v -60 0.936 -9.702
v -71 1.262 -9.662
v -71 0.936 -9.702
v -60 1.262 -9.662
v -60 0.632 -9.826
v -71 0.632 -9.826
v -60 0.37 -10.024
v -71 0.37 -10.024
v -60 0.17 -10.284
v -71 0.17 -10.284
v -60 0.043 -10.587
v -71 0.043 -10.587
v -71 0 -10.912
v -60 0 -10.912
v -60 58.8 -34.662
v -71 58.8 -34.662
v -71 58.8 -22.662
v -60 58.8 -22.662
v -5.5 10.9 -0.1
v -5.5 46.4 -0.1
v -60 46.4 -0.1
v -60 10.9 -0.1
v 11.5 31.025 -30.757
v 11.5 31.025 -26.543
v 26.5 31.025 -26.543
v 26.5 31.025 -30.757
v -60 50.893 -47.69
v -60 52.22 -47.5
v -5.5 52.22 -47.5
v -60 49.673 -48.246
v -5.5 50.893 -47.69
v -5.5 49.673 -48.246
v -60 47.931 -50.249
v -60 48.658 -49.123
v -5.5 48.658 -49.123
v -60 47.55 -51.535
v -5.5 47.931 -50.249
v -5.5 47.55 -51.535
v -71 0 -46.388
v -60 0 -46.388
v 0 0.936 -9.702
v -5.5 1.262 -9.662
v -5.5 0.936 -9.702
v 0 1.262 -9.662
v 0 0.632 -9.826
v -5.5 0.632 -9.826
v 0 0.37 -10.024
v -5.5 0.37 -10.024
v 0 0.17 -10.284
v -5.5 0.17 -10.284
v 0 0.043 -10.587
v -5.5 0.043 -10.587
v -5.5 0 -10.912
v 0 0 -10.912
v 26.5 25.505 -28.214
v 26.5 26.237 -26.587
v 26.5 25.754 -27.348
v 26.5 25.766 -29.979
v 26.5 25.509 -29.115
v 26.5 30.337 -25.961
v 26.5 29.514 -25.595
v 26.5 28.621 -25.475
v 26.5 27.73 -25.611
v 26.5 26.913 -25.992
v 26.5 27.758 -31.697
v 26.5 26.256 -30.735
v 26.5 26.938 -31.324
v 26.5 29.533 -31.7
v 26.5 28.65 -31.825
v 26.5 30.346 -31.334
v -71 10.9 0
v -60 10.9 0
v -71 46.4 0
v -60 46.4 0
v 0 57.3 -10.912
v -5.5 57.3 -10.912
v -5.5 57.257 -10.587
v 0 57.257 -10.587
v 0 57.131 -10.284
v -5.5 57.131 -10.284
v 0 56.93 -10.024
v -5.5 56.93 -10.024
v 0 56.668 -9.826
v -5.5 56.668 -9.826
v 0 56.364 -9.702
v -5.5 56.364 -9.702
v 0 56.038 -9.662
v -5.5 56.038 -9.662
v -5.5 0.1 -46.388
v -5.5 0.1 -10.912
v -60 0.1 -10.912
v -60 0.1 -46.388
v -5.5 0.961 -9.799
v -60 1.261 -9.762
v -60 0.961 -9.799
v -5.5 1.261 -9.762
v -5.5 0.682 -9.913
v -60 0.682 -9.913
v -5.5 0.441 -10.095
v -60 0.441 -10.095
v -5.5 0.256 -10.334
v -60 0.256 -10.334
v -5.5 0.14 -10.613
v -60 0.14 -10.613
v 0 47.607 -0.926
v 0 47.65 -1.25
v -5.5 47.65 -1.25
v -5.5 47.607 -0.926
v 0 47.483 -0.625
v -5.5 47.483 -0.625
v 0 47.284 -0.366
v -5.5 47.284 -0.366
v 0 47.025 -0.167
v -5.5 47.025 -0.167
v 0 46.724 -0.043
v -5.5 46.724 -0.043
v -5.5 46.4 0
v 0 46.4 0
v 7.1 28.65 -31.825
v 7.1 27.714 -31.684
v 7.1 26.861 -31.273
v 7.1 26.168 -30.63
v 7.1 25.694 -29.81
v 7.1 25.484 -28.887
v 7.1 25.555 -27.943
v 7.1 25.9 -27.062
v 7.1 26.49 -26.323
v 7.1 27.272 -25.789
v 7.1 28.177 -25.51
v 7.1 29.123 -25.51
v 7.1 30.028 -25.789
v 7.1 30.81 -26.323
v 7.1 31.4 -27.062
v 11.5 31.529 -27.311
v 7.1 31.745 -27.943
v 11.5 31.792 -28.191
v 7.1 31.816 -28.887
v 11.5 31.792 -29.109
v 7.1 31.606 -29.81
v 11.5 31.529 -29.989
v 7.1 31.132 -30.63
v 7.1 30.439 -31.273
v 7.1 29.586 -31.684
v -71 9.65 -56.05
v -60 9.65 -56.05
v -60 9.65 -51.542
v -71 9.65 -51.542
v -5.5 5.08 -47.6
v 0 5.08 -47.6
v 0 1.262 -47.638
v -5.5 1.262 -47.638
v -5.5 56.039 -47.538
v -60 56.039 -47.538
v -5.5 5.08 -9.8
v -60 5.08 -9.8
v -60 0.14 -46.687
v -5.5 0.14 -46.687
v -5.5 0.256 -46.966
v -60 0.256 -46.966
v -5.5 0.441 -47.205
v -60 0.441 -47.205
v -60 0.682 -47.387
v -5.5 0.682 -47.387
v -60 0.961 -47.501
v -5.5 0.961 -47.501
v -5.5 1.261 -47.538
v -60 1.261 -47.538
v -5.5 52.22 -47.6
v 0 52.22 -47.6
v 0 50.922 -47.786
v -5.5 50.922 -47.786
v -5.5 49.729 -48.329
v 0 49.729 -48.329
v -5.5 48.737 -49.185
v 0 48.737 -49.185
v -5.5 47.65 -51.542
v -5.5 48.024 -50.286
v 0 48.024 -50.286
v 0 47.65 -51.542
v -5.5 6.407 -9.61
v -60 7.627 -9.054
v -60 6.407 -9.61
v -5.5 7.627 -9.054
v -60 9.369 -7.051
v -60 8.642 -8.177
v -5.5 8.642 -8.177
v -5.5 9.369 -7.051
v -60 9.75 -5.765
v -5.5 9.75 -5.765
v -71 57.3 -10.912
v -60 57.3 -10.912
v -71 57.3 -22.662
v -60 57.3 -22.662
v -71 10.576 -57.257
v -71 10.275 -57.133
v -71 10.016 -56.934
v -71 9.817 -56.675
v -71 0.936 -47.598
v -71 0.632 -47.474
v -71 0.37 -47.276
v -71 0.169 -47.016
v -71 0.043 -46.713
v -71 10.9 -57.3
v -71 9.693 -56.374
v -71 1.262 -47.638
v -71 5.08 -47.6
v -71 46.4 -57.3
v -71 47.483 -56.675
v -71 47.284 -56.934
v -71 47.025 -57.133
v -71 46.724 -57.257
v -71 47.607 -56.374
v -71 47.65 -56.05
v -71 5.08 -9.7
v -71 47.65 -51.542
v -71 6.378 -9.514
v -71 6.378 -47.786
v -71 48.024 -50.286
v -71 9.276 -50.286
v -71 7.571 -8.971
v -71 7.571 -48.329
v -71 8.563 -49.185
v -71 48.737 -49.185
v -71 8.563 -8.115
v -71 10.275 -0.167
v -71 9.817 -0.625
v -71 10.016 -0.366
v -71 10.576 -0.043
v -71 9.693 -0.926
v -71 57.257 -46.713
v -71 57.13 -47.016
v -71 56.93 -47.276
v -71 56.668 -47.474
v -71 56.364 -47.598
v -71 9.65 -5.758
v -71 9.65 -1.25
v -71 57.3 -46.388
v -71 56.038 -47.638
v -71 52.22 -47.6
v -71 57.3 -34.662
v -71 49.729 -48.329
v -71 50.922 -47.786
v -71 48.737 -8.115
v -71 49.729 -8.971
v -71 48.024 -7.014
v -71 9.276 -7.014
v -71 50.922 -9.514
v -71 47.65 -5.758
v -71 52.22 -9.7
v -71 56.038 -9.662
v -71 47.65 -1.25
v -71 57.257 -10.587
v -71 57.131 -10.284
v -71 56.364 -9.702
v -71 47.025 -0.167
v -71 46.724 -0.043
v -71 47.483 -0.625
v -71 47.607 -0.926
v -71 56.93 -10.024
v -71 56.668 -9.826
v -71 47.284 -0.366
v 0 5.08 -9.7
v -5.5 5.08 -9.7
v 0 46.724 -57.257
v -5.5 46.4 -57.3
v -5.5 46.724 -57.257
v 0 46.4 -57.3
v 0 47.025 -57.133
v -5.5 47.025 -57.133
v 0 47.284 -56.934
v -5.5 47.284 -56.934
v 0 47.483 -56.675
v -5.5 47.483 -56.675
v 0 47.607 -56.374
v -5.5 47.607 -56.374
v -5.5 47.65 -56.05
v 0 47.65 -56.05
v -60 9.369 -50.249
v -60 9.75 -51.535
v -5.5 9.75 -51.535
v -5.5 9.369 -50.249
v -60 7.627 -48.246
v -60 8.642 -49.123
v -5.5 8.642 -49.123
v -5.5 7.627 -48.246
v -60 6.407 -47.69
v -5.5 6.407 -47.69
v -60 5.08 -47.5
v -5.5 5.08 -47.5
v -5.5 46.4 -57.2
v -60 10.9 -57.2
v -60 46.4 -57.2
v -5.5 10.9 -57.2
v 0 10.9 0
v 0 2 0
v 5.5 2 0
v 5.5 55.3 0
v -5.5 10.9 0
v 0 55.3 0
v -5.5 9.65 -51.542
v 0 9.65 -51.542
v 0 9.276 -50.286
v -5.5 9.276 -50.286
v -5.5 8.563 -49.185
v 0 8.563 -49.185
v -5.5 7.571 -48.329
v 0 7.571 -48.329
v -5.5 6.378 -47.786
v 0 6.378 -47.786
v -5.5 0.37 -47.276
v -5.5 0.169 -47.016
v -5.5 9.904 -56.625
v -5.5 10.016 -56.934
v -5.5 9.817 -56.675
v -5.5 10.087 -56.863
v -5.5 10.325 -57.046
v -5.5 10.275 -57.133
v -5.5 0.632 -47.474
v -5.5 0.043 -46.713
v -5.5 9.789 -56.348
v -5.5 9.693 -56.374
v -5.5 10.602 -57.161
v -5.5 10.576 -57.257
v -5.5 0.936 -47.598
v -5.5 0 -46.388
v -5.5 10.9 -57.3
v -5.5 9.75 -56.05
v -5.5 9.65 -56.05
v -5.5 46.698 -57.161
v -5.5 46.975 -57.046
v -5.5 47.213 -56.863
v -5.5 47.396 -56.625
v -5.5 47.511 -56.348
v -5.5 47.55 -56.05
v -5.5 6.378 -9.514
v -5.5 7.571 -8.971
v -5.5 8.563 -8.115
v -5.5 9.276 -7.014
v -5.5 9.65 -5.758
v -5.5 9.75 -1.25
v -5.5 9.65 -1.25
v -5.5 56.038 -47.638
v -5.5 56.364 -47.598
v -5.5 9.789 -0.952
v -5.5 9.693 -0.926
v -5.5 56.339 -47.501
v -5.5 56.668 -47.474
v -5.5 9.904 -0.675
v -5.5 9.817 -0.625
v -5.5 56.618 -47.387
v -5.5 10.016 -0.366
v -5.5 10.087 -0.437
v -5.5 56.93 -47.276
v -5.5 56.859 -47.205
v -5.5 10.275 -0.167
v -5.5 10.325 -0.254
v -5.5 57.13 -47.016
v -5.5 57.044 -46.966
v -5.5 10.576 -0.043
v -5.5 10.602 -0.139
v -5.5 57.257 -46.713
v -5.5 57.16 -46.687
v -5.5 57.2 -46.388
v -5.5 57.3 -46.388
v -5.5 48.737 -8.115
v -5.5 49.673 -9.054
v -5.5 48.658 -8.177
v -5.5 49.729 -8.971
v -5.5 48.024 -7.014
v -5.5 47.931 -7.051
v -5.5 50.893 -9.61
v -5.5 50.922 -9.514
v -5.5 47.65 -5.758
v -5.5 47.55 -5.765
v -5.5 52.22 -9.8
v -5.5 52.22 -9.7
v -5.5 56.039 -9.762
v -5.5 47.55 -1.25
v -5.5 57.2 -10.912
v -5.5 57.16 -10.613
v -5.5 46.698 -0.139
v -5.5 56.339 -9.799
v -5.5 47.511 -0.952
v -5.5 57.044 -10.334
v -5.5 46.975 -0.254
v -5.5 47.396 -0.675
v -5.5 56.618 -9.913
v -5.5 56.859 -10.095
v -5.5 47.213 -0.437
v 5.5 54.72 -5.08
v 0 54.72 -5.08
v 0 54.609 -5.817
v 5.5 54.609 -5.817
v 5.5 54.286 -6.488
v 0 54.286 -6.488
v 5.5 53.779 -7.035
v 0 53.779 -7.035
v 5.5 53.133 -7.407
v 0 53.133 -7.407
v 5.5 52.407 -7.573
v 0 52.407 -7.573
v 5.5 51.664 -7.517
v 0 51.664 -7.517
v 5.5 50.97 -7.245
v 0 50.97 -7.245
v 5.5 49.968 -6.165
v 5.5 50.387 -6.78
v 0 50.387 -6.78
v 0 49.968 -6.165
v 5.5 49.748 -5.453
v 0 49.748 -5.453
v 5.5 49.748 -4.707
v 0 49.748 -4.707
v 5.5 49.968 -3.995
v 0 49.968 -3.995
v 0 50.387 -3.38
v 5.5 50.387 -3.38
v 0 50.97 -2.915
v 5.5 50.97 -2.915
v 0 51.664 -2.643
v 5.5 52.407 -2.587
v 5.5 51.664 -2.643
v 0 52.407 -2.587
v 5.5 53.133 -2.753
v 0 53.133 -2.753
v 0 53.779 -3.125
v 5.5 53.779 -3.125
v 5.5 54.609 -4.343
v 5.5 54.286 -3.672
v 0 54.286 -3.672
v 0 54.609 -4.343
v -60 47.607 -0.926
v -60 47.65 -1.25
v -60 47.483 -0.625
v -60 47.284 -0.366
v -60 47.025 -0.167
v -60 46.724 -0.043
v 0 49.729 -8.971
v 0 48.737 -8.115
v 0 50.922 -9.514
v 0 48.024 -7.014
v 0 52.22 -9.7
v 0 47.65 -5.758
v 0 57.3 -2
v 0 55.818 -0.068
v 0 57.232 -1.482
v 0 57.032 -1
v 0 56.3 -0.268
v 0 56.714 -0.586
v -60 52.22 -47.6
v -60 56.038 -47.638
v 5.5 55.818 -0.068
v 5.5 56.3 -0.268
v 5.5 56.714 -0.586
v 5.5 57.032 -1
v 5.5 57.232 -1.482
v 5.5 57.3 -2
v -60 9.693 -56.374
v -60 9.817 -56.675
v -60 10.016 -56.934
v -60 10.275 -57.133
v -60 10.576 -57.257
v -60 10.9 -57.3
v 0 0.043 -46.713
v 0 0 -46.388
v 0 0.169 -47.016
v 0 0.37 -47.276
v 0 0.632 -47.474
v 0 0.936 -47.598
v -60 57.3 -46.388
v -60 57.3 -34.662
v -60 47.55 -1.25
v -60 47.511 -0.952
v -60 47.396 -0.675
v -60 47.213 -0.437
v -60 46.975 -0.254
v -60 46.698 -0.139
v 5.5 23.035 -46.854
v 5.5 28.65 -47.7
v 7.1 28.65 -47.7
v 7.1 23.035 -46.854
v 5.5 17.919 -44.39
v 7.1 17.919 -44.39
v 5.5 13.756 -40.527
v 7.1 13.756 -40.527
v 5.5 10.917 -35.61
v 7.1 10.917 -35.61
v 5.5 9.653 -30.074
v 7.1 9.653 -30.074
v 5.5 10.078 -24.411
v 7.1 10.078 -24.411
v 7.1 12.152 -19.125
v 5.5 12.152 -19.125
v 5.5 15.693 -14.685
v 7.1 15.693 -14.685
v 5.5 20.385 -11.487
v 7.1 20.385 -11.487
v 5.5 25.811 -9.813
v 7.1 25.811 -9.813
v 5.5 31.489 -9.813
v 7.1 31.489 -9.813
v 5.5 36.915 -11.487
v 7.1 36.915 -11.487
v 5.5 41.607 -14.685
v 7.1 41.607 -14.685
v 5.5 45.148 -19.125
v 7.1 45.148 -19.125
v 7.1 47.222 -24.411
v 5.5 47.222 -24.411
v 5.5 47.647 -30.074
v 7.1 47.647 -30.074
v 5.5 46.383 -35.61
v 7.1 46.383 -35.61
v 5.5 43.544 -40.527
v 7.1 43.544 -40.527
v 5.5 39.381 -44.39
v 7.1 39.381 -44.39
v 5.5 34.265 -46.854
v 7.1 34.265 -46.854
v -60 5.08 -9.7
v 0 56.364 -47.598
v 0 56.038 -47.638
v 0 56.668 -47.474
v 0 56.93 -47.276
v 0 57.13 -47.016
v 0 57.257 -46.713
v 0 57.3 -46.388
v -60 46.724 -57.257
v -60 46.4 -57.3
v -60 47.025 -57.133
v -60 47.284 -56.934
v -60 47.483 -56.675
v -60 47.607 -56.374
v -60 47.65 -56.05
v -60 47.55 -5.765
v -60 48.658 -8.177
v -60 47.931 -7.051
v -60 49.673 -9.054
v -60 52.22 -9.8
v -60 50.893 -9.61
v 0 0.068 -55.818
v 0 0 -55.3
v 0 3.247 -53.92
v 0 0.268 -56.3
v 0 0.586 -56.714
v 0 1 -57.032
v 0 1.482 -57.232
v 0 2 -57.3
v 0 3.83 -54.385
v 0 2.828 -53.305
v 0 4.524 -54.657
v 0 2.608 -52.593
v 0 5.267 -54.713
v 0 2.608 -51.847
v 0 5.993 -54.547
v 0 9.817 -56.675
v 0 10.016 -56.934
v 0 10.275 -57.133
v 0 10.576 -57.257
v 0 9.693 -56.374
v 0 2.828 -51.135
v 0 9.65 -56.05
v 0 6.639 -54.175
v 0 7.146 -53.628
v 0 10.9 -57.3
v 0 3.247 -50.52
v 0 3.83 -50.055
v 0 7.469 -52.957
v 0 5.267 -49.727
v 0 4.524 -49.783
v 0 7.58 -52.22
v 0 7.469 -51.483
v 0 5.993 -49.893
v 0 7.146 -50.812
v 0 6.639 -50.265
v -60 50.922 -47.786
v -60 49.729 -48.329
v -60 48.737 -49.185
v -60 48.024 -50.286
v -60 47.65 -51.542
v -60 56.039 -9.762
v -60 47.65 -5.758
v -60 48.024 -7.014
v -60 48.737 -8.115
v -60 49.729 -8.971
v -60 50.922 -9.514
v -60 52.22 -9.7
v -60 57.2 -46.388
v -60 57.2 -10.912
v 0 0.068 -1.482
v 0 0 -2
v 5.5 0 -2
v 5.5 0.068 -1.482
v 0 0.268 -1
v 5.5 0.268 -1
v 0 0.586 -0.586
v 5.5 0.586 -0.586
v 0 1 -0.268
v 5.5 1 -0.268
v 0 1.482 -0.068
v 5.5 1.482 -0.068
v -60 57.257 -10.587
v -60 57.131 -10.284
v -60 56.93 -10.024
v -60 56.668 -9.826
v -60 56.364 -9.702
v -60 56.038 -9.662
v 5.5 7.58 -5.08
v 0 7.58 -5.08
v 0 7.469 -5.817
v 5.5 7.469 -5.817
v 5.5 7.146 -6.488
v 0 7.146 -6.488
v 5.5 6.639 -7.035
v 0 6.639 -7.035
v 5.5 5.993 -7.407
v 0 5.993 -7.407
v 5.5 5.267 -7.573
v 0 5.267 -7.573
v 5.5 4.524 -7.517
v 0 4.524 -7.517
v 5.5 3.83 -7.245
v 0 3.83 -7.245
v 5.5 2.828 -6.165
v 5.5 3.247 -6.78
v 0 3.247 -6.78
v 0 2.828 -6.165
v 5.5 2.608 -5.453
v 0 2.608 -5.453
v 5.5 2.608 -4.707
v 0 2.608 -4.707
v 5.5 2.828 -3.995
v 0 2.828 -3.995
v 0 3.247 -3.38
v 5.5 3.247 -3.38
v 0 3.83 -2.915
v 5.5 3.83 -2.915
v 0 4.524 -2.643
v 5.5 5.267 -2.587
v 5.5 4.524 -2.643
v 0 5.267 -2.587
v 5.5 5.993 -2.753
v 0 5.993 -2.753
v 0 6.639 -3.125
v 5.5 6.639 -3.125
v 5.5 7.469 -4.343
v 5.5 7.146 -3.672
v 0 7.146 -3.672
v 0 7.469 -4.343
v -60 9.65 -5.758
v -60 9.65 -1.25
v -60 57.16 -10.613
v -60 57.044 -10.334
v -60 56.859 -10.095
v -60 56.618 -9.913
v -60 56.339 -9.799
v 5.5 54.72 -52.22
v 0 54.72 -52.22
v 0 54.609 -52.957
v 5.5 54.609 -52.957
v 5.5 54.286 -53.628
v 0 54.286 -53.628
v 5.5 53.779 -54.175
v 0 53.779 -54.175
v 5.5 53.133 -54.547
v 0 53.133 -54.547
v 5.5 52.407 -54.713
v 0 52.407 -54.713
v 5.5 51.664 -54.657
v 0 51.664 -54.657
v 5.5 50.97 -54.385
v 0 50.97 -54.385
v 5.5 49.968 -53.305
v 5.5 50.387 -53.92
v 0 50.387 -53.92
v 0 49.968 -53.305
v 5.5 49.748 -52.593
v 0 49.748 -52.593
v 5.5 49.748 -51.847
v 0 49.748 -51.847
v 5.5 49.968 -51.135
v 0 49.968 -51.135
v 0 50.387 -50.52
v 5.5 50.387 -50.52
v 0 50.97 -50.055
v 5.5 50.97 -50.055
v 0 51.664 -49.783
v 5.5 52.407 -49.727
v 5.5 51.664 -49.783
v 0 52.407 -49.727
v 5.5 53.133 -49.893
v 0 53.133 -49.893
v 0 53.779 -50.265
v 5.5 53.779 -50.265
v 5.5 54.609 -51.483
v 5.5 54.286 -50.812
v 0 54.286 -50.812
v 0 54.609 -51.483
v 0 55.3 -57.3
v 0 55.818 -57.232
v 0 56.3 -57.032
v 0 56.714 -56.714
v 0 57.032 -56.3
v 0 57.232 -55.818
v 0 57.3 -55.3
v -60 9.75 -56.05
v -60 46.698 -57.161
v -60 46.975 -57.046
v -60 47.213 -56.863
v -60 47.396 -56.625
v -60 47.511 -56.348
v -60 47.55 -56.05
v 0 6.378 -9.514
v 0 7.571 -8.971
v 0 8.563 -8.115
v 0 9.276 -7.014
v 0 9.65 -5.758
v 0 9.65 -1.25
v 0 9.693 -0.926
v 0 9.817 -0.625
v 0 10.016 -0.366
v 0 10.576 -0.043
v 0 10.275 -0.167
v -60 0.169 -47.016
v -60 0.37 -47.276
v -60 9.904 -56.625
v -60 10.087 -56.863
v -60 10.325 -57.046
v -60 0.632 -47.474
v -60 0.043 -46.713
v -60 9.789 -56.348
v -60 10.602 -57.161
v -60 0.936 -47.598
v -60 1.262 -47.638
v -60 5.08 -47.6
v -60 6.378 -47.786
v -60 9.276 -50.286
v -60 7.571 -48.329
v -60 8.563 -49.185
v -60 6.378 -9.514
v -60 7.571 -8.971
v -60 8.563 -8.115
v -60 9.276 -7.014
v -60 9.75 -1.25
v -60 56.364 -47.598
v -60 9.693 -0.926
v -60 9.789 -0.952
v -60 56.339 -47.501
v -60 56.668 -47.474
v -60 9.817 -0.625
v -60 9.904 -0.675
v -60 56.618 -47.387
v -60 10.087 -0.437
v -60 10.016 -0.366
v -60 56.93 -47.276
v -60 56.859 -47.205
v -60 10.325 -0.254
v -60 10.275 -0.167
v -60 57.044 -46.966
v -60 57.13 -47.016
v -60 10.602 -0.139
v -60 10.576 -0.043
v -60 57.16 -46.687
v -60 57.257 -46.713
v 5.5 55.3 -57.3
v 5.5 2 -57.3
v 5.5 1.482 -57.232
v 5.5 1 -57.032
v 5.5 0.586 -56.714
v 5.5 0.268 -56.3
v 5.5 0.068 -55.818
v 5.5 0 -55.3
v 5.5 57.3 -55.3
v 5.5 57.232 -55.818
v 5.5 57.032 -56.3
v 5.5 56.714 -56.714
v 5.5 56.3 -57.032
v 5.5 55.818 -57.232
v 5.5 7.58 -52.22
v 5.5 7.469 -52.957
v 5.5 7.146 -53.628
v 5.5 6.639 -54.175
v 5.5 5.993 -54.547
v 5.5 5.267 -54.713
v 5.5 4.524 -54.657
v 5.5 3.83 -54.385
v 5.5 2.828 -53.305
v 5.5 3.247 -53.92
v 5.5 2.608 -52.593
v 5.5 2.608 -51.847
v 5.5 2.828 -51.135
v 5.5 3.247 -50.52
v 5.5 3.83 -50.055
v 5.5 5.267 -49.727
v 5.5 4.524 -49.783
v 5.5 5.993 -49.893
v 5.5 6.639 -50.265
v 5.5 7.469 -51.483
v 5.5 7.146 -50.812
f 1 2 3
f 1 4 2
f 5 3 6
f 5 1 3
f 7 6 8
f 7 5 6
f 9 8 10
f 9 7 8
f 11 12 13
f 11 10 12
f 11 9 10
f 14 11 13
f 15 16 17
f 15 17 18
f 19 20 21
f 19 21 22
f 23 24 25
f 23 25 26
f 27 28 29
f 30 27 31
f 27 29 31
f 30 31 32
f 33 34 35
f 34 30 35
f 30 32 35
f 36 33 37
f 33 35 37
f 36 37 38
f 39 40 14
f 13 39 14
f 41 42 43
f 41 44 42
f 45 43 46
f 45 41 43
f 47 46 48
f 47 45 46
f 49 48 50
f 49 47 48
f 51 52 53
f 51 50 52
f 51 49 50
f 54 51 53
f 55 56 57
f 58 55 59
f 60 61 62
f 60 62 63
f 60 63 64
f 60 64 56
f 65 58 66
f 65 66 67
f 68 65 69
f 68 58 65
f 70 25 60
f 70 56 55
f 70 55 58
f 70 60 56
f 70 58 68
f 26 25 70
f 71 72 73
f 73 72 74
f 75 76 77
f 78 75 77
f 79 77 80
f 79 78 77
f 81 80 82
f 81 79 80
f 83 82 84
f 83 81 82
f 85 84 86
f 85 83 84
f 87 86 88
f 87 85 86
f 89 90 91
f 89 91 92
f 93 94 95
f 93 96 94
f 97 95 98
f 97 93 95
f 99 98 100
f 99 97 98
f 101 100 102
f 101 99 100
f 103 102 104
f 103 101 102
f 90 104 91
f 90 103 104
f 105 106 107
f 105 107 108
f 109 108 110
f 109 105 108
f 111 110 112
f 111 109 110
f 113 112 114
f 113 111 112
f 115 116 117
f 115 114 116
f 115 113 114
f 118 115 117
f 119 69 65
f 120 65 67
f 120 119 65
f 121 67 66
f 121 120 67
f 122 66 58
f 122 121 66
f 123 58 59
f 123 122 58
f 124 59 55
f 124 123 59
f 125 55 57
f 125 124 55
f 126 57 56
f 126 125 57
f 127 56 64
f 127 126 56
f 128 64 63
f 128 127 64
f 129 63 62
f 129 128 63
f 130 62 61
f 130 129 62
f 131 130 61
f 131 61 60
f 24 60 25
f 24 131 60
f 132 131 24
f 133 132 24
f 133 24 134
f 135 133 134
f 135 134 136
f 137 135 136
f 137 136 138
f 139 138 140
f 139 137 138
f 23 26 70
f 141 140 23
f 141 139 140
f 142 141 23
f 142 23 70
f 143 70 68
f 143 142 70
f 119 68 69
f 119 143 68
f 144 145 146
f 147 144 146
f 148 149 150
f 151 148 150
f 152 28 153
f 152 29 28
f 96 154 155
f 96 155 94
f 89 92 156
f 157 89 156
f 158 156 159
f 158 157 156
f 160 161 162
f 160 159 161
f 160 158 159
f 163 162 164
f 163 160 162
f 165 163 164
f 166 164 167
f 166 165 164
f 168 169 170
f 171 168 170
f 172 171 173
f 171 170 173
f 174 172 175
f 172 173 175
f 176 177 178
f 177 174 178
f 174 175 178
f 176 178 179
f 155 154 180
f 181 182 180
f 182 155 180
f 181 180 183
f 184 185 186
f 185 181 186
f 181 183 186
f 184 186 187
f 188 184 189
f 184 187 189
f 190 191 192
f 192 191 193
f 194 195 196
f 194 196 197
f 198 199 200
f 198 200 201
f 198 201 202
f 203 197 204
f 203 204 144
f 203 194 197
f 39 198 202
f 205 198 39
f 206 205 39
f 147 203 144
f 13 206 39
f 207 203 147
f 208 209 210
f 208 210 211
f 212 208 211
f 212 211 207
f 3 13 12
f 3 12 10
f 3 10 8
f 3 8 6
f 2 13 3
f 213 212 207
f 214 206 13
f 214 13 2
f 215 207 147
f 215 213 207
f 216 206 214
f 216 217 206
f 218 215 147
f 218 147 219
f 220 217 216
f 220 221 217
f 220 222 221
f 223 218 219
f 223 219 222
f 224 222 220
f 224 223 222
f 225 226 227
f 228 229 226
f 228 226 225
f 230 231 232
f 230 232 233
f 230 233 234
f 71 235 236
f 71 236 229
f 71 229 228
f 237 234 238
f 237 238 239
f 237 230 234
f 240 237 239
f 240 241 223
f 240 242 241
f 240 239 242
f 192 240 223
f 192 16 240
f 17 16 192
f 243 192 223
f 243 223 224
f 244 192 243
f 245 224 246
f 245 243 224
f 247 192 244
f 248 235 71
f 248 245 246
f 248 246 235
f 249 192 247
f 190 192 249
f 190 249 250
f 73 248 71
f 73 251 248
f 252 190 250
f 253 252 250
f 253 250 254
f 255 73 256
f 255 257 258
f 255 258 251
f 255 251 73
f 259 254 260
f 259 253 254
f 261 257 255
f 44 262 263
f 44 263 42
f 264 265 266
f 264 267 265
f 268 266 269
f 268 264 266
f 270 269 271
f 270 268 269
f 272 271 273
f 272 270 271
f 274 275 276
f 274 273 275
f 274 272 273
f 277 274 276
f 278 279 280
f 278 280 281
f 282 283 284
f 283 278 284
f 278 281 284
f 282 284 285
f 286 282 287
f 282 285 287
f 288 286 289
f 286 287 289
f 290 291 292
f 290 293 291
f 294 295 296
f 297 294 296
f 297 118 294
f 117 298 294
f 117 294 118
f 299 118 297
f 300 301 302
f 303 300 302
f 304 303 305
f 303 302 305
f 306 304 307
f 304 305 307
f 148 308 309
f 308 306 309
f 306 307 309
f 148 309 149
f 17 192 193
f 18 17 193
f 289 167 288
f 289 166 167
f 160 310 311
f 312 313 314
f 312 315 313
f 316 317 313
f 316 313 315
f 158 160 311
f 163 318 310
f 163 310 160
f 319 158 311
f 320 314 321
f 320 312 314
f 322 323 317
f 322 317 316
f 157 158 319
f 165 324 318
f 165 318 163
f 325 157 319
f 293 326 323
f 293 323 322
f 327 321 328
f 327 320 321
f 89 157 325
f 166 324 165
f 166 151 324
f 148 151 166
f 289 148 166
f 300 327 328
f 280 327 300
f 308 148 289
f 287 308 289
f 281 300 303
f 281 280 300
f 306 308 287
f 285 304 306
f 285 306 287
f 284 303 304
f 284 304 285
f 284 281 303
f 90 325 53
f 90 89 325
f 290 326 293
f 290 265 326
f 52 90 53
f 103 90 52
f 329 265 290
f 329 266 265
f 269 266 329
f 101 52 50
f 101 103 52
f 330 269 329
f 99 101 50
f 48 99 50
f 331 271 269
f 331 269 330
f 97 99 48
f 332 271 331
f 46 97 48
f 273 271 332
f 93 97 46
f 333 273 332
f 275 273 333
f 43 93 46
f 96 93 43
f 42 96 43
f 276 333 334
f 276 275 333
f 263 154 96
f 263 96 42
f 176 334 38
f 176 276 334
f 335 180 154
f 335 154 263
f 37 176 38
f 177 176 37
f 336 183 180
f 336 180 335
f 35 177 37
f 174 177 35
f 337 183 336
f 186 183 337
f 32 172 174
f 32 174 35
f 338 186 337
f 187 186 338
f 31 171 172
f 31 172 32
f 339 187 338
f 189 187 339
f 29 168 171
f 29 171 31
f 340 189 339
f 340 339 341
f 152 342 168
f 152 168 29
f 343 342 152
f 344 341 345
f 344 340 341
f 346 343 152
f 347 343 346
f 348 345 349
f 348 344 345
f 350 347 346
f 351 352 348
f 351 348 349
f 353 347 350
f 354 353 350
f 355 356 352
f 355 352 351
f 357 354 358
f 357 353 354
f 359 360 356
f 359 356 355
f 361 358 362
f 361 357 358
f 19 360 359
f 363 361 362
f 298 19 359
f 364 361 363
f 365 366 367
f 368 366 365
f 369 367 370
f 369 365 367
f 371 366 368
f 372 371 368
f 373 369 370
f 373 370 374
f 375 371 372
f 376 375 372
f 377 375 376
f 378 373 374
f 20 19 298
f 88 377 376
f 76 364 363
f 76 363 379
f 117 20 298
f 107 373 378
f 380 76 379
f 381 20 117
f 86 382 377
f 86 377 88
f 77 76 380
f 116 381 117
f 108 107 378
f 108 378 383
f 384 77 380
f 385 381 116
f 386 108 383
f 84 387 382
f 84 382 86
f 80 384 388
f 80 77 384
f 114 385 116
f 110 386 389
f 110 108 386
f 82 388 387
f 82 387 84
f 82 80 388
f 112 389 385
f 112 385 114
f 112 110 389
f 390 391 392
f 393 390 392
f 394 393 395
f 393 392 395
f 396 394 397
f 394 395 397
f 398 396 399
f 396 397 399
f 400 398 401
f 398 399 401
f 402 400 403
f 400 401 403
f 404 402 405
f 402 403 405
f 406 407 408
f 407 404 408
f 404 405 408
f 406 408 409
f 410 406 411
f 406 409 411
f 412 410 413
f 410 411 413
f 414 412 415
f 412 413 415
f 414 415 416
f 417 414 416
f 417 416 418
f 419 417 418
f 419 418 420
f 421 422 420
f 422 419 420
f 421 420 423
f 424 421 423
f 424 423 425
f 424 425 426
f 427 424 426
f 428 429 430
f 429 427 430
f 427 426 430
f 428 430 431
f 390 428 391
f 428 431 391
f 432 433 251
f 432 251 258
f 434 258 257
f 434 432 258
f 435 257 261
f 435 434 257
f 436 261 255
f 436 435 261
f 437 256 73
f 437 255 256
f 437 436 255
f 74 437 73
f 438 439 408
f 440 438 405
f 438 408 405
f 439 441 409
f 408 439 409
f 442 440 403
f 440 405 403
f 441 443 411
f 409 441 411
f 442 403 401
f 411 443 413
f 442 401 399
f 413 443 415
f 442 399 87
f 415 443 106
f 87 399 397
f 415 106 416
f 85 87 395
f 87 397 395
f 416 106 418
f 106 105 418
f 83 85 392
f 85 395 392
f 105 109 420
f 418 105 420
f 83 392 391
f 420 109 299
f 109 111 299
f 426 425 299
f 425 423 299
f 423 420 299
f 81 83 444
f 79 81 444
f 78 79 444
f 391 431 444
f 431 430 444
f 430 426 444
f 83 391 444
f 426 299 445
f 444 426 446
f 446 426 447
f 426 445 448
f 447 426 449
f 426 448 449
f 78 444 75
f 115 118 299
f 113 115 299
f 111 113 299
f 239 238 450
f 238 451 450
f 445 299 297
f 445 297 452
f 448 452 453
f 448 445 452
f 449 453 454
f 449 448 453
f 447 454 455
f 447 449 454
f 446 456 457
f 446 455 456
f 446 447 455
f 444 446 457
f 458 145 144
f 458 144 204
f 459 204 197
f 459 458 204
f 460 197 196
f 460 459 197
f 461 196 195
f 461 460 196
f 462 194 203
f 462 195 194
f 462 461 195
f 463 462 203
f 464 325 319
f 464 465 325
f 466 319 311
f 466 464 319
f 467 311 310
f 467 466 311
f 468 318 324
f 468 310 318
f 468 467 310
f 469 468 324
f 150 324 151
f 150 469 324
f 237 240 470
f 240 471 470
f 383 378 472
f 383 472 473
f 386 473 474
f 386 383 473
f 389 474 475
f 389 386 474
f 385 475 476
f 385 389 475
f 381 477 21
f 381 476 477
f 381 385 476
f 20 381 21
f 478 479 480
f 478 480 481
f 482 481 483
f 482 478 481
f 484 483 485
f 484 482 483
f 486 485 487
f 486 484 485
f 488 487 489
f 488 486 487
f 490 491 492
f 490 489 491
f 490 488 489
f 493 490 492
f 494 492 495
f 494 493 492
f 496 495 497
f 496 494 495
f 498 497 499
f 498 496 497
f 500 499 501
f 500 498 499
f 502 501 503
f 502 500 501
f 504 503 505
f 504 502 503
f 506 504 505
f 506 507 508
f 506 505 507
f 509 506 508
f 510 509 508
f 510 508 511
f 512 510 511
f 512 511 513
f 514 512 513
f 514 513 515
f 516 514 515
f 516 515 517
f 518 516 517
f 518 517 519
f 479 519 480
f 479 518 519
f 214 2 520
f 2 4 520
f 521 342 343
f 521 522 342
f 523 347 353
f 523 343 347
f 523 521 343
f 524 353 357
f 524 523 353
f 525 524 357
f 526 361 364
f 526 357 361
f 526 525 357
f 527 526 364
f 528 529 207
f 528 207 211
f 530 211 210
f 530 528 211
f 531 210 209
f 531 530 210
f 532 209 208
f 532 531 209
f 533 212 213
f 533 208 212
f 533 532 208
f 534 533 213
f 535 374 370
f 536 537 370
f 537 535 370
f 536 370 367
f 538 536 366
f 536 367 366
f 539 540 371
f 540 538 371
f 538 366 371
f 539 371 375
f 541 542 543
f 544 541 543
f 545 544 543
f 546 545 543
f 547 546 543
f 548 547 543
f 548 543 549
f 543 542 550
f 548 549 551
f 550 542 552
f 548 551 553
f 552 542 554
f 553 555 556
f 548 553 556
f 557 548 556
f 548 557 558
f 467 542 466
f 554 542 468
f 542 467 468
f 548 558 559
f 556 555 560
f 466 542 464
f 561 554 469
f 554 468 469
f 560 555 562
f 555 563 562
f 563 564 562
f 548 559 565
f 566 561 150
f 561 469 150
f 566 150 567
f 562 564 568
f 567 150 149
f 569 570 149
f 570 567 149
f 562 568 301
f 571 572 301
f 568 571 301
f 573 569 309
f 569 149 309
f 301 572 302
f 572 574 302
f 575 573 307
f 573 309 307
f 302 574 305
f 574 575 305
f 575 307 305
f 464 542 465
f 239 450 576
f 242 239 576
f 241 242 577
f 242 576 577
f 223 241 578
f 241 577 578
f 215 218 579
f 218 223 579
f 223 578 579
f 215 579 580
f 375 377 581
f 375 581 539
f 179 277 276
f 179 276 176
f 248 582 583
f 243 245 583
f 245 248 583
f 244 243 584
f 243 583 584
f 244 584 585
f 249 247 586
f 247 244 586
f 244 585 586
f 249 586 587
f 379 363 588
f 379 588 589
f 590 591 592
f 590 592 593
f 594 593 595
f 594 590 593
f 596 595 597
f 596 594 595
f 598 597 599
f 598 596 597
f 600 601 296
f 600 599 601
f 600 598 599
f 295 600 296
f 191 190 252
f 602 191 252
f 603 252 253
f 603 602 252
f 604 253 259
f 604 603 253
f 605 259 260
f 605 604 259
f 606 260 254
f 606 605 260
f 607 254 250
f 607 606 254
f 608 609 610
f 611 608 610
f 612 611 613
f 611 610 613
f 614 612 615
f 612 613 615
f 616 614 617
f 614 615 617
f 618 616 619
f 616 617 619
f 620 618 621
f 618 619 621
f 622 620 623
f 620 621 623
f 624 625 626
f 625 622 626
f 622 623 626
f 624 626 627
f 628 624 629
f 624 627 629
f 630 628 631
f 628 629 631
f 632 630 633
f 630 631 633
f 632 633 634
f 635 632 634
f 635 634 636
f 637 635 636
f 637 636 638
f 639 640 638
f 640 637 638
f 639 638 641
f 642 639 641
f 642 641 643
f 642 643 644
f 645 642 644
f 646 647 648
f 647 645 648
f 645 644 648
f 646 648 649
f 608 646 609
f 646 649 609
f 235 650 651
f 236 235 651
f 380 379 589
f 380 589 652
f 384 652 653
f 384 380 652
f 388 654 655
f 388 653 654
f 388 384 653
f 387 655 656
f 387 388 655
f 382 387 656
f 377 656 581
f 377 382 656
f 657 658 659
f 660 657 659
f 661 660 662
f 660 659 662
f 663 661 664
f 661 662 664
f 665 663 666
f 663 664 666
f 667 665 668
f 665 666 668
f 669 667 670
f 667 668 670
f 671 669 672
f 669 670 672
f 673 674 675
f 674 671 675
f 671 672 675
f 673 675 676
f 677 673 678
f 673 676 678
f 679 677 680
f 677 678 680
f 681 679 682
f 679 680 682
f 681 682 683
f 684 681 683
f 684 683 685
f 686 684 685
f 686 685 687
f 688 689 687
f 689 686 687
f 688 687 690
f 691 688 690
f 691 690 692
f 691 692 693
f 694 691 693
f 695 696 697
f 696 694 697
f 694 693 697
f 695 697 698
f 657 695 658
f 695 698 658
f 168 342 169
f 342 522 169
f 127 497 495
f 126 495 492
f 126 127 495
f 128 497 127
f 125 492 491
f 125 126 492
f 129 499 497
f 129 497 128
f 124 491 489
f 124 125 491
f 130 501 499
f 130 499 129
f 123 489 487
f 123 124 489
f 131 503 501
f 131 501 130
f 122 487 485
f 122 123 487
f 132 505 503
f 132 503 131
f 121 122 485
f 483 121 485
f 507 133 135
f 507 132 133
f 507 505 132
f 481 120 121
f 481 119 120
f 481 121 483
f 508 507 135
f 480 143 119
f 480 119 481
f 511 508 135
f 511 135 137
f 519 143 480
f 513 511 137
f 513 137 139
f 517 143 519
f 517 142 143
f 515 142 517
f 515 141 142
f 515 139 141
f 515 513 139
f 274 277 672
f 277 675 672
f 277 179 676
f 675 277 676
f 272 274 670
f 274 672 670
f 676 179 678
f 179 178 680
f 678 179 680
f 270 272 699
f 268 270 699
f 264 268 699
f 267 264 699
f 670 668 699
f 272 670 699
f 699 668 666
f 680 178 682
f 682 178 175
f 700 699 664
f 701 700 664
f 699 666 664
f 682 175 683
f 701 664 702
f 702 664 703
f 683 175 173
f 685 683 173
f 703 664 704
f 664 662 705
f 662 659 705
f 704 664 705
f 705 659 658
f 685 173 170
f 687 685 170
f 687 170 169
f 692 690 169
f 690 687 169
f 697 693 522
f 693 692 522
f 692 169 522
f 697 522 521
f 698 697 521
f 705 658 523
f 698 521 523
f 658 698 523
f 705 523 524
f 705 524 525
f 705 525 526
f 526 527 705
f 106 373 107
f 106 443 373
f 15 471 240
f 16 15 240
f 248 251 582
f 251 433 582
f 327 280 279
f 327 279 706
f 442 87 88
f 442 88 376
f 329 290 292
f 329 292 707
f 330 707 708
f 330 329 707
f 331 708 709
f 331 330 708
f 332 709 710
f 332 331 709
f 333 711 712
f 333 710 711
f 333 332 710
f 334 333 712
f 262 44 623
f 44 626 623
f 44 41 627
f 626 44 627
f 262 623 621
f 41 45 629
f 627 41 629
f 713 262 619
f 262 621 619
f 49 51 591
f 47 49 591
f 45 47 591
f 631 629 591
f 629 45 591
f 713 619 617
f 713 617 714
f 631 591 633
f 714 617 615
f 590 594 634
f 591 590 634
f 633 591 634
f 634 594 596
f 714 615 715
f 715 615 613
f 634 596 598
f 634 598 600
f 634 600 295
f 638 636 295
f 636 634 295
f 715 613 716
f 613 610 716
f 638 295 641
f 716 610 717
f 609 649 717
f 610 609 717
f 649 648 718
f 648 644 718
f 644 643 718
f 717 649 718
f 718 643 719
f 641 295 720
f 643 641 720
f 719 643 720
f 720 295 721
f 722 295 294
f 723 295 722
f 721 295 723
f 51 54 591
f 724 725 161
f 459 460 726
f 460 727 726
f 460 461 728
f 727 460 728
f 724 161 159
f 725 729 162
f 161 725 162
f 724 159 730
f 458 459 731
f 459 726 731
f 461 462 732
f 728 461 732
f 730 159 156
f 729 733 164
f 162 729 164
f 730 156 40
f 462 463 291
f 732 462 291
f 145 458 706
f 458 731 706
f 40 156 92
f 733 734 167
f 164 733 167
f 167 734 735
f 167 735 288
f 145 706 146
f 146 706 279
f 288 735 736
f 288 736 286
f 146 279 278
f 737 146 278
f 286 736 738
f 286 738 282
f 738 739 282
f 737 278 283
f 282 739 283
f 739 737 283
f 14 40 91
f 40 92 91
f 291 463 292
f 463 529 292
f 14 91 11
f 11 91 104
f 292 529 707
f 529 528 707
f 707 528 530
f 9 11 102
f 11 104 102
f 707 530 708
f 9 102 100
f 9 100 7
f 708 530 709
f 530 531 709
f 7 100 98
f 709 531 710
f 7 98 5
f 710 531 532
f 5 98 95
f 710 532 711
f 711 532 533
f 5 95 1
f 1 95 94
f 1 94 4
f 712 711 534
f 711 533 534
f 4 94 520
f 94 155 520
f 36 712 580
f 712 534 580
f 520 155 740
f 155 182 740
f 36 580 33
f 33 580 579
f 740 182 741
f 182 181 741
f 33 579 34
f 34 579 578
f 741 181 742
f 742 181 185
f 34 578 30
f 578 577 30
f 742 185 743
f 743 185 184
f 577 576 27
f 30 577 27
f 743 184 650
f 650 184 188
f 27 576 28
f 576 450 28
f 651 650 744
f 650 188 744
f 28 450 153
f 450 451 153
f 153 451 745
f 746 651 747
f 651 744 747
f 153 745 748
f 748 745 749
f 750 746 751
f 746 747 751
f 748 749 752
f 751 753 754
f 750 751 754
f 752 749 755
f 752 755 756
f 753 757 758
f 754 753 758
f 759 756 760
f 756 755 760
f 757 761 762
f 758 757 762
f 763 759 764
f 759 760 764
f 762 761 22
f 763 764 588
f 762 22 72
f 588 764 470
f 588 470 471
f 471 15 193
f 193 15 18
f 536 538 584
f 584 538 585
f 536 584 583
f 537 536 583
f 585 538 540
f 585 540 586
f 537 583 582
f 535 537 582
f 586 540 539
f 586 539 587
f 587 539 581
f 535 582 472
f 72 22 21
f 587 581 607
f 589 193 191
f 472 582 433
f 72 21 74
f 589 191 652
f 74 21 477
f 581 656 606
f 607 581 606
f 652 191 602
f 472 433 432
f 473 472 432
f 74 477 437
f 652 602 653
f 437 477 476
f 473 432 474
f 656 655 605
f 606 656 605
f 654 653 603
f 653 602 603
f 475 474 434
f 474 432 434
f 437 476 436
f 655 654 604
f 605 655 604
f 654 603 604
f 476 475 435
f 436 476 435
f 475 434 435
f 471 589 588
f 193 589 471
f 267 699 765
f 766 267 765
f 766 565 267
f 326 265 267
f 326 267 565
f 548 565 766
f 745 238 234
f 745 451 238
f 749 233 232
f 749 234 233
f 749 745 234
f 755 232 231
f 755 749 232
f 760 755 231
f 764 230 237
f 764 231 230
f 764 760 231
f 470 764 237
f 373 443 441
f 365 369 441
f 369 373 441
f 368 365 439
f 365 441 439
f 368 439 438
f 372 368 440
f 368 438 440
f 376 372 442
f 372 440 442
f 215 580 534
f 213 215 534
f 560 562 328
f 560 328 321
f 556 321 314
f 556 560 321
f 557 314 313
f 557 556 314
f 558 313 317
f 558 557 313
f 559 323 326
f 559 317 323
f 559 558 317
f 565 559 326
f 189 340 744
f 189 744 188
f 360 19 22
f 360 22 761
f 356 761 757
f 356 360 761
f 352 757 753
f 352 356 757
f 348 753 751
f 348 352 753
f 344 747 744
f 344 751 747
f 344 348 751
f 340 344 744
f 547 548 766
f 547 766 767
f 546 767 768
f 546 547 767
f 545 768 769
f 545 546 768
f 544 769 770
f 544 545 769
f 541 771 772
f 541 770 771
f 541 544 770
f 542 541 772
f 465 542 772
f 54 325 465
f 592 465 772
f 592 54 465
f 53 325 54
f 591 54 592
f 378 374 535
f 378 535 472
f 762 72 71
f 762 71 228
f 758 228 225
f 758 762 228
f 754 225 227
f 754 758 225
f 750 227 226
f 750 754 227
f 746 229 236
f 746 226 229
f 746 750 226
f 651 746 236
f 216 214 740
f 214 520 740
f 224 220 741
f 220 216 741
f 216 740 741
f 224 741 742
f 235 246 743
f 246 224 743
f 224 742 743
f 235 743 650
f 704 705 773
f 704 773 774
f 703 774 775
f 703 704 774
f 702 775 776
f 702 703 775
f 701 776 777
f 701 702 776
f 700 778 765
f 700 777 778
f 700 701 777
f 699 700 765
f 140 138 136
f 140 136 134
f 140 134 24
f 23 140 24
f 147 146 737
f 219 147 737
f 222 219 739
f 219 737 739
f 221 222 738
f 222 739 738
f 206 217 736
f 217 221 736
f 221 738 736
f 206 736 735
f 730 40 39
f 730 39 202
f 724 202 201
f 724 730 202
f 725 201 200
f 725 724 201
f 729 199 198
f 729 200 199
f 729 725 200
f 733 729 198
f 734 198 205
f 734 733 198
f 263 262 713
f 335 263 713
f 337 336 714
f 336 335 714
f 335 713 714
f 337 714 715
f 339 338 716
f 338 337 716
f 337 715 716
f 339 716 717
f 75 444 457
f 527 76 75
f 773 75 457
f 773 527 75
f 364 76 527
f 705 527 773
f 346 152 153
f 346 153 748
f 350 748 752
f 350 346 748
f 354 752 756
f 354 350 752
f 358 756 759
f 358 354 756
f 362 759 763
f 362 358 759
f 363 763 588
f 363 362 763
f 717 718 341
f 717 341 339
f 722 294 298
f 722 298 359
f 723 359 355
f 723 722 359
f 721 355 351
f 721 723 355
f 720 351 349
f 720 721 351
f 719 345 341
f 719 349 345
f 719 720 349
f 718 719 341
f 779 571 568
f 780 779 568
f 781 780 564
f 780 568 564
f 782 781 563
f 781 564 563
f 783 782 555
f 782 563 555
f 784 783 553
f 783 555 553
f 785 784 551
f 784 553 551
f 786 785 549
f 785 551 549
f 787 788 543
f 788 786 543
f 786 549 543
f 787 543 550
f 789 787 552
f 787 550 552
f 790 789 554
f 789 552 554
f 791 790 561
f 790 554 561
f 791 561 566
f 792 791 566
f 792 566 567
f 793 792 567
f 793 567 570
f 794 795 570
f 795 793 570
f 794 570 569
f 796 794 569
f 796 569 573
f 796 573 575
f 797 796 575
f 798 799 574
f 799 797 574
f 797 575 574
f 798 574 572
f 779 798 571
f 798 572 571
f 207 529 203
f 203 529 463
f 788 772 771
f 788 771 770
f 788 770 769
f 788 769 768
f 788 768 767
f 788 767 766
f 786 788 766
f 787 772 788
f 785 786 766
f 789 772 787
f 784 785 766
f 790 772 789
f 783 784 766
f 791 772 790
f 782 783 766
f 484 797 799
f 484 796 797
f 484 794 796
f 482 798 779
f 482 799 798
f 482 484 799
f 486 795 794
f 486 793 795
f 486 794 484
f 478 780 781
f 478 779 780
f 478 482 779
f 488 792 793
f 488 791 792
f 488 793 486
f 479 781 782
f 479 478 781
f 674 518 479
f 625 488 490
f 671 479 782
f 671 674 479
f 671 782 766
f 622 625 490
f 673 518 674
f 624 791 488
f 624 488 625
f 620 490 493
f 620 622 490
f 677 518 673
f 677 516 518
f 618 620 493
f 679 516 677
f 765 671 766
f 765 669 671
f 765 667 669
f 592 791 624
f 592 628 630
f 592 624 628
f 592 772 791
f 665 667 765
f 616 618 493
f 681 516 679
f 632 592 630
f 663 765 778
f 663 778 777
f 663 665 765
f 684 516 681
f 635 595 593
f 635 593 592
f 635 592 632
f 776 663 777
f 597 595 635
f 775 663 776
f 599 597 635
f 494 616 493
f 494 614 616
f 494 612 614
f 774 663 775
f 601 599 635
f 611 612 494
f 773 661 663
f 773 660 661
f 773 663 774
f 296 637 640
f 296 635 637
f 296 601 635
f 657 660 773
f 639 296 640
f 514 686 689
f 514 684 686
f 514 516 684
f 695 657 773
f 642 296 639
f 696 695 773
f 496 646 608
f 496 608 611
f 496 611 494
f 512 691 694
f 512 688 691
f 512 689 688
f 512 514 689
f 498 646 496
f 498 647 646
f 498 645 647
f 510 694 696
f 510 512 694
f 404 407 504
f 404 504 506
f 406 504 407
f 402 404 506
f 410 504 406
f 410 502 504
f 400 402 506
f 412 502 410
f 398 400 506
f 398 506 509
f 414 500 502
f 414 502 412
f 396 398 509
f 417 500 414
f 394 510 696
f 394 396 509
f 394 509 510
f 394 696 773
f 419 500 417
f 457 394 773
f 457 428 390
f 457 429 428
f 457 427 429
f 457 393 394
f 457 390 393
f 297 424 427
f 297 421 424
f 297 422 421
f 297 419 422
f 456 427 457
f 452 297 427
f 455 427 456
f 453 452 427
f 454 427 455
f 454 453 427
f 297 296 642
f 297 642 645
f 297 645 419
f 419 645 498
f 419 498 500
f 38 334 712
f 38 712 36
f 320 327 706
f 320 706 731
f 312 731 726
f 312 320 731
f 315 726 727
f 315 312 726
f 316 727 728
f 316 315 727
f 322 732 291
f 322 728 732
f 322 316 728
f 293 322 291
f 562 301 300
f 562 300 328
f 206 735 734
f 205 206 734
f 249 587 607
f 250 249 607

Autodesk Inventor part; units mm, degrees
ref_plane "YZ Plane" through (0, 0, 0) normal (1, 0, 0) x (0, 1, 0)
ref_plane "XZ Plane" through (0, 0, 0) normal (0, 1, 0) x (-1, 0, 0)
ref_plane "XY Plane" through (0, 0, 0) normal (0, 0, 1) x (1, 0, 0)
sketch "Sketch1" plane through (0, 0, 0) normal (1, 0, 0) x (0, 1, 0)
  line L0 (2, 0) -> (55.3, 0)
  line L1 (57.3, -2) -> (57.3, -55.3)
  line L2 (55.3, -57.3) -> (2, -57.3)
  line L3 (0, -55.3) -> (0, -2)
  arc A0 (57.3, -2) -> (55.3, 0) centre (55.3, -2) ccw
  arc A1 (55.3, -57.3) -> (57.3, -55.3) centre (55.3, -55.3) ccw
  arc A2 (0, -55.3) -> (2, -57.3) centre (2, -55.3) ccw
  arc A3 (2, 0) -> (0, -2) centre (2, -2) ccw
  line L4 (52.22, -5.08) -> (5.08, -5.08) construction
  line L5 (5.08, -5.08) -> (5.08, -52.22) construction
  line L6 (5.08, -52.22) -> (52.22, -52.22) construction
  line L7 (52.22, -52.22) -> (52.22, -5.08) construction
  line L8 (52.22, -5.08) -> (57.3, -5.08) construction
  line L9 (52.22, -5.08) -> (52.22, 0) construction
  line L10 (5.08, -52.22) -> (0, -52.22) construction
  line L11 (5.08, -52.22) -> (5.08, -57.3) construction
  circle A4 centre (52.22, -5.08) radius 2.5
  circle A5 centre (52.22, -52.22) radius 2.5
  circle A6 centre (5.08, -52.22) radius 2.5
  circle A7 centre (5.08, -5.08) radius 2.5
  point P0 (0, 0)
  point P1 (57.3, -57.3)
  point P2 (57.3, 0)
  point P3 (0, -57.3)
  dimension "d0" = 57.3
  dimension "d1" = 57.3
  dimension "d2" = 2
  dimension "d3" = 2
  dimension "d4" = 5
  dimension "d5" = 5
  dimension "d6" = 5
  dimension "d7" = 5
  dimension "d8" = 47.14
  dimension "d9" = 47.14
extrude "Extrusion1" add sketch "Sketch1" along normal blind 5.5
sketch "Sketch2" plane through (0, 0, 0) normal (-1, 0, 0) x (0, 0, 1)
  line L0 (-57.3, 2) -> (-57.3, 55.3) construction
  arc A0 (-57.3, 2) -> (-55.3, 0) centre (-55.3, 2) ccw projected
  line L1 (-2, 0) -> (-55.3, 0) construction
  arc A1 (-2, 0) -> (0, 2) centre (-2, 2) ccw projected
  line L2 (0, 55.3) -> (0, 2) construction
  arc A2 (0, 55.3) -> (-2, 57.3) centre (-2, 55.3) ccw projected
  line L3 (-55.3, 57.3) -> (-2, 57.3) construction
  arc A3 (-55.3, 57.3) -> (-57.3, 55.3) centre (-55.3, 55.3) ccw projected
  circle A4 centre (-5.08, 52.22) radius 2.5 projected
  circle A5 centre (-52.22, 52.22) radius 2.5 projected
  circle A6 centre (-52.22, 5.08) radius 2.5 projected
  circle A7 centre (-5.08, 5.08) radius 2.5 projected
  line L4 (-55.3, 57.3) -> (-2, 57.3) construction
  line L5 (-47.65, 57.3) -> (-9.65, 57.3)
  line L6 (-57.3, 2) -> (-57.3, 55.3) construction
  line L7 (-57.3, 9.65) -> (-57.3, 47.65)
  line L8 (-2, 0) -> (-55.3, 0) construction
  line L9 (-47.65, 0) -> (-9.65, 0)
  line L10 (0, 9.65) -> (0, 47.65)
  line L11 (0, 55.3) -> (0, 2) construction
  circle A8 centre (-52.22, 5.08) radius 2.5 construction
  line L12 (-52.22, 5.08) -> (-5.08, 52.22) construction
  line L13 (-28.65, 28.65) -> (-28.65, 57.3) construction
  line L14 (-28.65, 28.65) -> (-28.65, 0) construction
  line L15 (-28.65, 28.65) -> (0, 28.65) construction
  line L16 (-28.65, 28.65) -> (-57.3, 28.65) construction
  arc A9 (-51.5421, 47.65) -> (-47.6, 52.22) centre (-52.22, 52.22) ccw
  arc A10 (-9.7, 52.22) -> (-5.7579, 47.65) centre (-5.08, 52.22) ccw
  arc A11 (-5.7579, 9.65) -> (-9.7, 5.08) centre (-5.08, 5.08) ccw
  arc A12 (-47.6, 5.08) -> (-51.5421, 9.65) centre (-52.22, 5.08) ccw
  line L17 (-47.65, 57.3) -> (-47.6, 52.22)
  line L18 (-57.3, 47.65) -> (-51.5421, 47.65)
  line L19 (-9.7, 5.08) -> (-9.65, 0)
  line L20 (0, 9.65) -> (-5.7579, 9.65)
  line L21 (-9.6451, 47.6951) -> (-9.6048, 47.6952)
  line L22 (-5.7579, 47.65) -> (0, 47.65)
  line L23 (-9.65, 57.3) -> (-9.7, 52.22)
  line L24 (-9.6451, 47.6951) -> (-9.6451, 47.6549)
  line L25 (-47.6048, 9.6549) -> (-47.6452, 9.6548)
  line L26 (-51.5421, 9.65) -> (-57.3, 9.65)
  line L27 (-47.6049, 9.6951) -> (-47.6048, 9.6549)
  line L28 (-47.6, 5.08) -> (-47.65, 0)
  arc A13 (-56.05, 47.65) -> (-57.3, 46.4) centre (-56.05, 46.4) ccw
  arc A14 (-46.3876, 57.3) -> (-47.6376, 56.0377) centre (-46.3876, 56.05) ccw
  arc A15 (-9.6624, 56.0377) -> (-10.9124, 57.3) centre (-10.9124, 56.05) ccw
  arc A16 (0, 46.4) -> (-1.25, 47.65) centre (-1.25, 46.4) ccw
  arc A17 (-1.25, 9.65) -> (0, 10.9) centre (-1.25, 10.9) ccw
  arc A18 (-10.9124, 0) -> (-9.6624, 1.2623) centre (-10.9124, 1.25) ccw
  arc A19 (-47.6376, 1.2623) -> (-46.3876, 0) centre (-46.3876, 1.25) ccw
  arc A20 (-57.3, 10.9) -> (-56.05, 9.65) centre (-56.05, 10.9) ccw
  line L29 (-55.3, 57.3) -> (-2, 57.3) projected
  line L30 (-57.3, 2) -> (-57.3, 55.3) projected
  line L31 (0, 55.3) -> (0, 2) projected
  point P0 (0, 0)
  point P1 (-10.9124, 57.3)
  dimension "d12" = 38
  dimension "d13" = 38
  dimension "d14" = 38
  dimension "d15" = 38
  dimension "d16" = 2.12
  dimension "d17" = 2.12
  dimension "d18" = 2.12
  dimension "d19" = 2.12
  dimension "d20" = 2.5
  dimension "d21" = 2.5
  dimension "d22" = 2.5
  dimension "d23" = 2.5
  dimension "d24" = 2.5
  dimension "d25" = 2.5
  dimension "d26" = 2.5
  dimension "d27" = 2.5
extrude "Extrusion2" add sketch "Sketch2" along normal blind 5.5 contours L10 A17 L20 A11 L19 A18 L9 A19 L28 A12 L26 A20 L7 A13 L18 A9 L17 A14 L5 A15 L23 A10 L22 A16
sketch "Sketch3" plane through (-5.5, 0, 0) normal (-1, 0, 0) x (0, 0, 1)
  line L0 (-51.5421, 47.65) -> (-56.05, 47.65) projected
  arc A0 (-56.05, 47.65) -> (-57.3, 46.4) centre (-56.05, 46.4) ccw projected
  line L1 (-57.3, 46.4) -> (-57.3, 10.9) projected
  arc A1 (-57.3, 10.9) -> (-56.05, 9.65) centre (-56.05, 10.9) ccw projected
  line L2 (-56.05, 9.65) -> (-51.5421, 9.65) projected
  arc A2 (-47.6, 5.08) -> (-51.5421, 9.65) centre (-52.22, 5.08) ccw projected
  line L3 (-47.6, 5.08) -> (-47.6376, 1.2623) projected
  arc A3 (-47.6376, 1.2623) -> (-46.3876, 0) centre (-46.3876, 1.25) ccw projected
  line L4 (-46.3876, 0) -> (-10.9124, 0) projected
  arc A4 (-10.9124, 0) -> (-9.6624, 1.2623) centre (-10.9124, 1.25) ccw projected
  line L5 (-9.6624, 1.2623) -> (-9.7, 5.08) projected
  arc A5 (-5.7579, 9.65) -> (-9.7, 5.08) centre (-5.08, 5.08) ccw projected
  line L6 (-5.7579, 9.65) -> (-1.25, 9.65) projected
  arc A6 (-1.25, 9.65) -> (0, 10.9) centre (-1.25, 10.9) ccw projected
  line L7 (0, 10.9) -> (0, 46.4) projected
  arc A7 (0, 46.4) -> (-1.25, 47.65) centre (-1.25, 46.4) ccw projected
  line L8 (-1.25, 47.65) -> (-5.7579, 47.65) projected
  arc A8 (-9.7, 52.22) -> (-5.7579, 47.65) centre (-5.08, 52.22) ccw projected
  line L9 (-9.7, 52.22) -> (-9.6624, 56.0377) projected
  arc A9 (-9.6624, 56.0377) -> (-10.9124, 57.3) centre (-10.9124, 56.05) ccw projected
  line L10 (-10.9124, 57.3) -> (-46.3876, 57.3) projected
  arc A10 (-46.3876, 57.3) -> (-47.6376, 56.0377) centre (-46.3876, 56.05) ccw projected
  line L11 (-47.6376, 56.0377) -> (-47.6, 52.22) projected
  arc A11 (-51.5421, 47.65) -> (-47.6, 52.22) centre (-52.22, 52.22) ccw projected
  line L12 (-46.3876, 57.2) -> (-10.9124, 57.2)
  arc A12 (-9.7624, 56.0387) -> (-10.9124, 57.2) centre (-10.9124, 56.05) ccw
  line L13 (-9.7624, 56.0387) -> (-9.8, 52.2205)
  arc A13 (-9.8, 52.2205) -> (-5.7652, 47.55) centre (-5.08, 52.22) ccw
  line L14 (-5.7652, 47.55) -> (-1.25, 47.55)
  arc A14 (-0.1, 46.4) -> (-1.25, 47.55) centre (-1.25, 46.4) ccw
  line L15 (-0.1, 46.4) -> (-0.1, 10.9)
  arc A15 (-1.25, 9.75) -> (-0.1, 10.9) centre (-1.25, 10.9) ccw
  line L16 (-1.25, 9.75) -> (-5.7652, 9.75)
  arc A16 (-5.7652, 9.75) -> (-9.8, 5.0795) centre (-5.08, 5.08) ccw
  line L17 (-9.8, 5.0795) -> (-9.7624, 1.2613)
  arc A17 (-10.9124, 0.1) -> (-9.7624, 1.2613) centre (-10.9124, 1.25) ccw
  line L18 (-10.9124, 0.1) -> (-46.3876, 0.1)
  arc A18 (-47.5376, 1.2613) -> (-46.3876, 0.1) centre (-46.3876, 1.25) ccw
  line L19 (-47.5376, 1.2613) -> (-47.5, 5.0795)
  arc A19 (-47.5, 5.0795) -> (-51.5348, 9.75) centre (-52.22, 5.08) ccw
  line L20 (-51.5348, 9.75) -> (-56.05, 9.75)
  arc A20 (-57.2, 10.9) -> (-56.05, 9.75) centre (-56.05, 10.9) ccw
  line L21 (-57.2, 10.9) -> (-57.2, 46.4)
  arc A21 (-56.05, 47.55) -> (-57.2, 46.4) centre (-56.05, 46.4) ccw
  line L22 (-56.05, 47.55) -> (-51.5348, 47.55)
  arc A22 (-51.5348, 47.55) -> (-47.5, 52.2205) centre (-52.22, 52.22) ccw
  line L23 (-47.5, 52.2205) -> (-47.5376, 56.0387)
  arc A23 (-46.3876, 57.2) -> (-47.5376, 56.0387) centre (-46.3876, 56.05) ccw
  point P0 (0, 0)
  dimension "d30" = 0.1
extrude "Extrusion3" add sketch "Sketch3" along normal blind 54.5 contours L12 A12 L13 A13 L14 A14 L15 A15 L16 A16 L17 A17 L18 A18 L19 A19 L20 A20 L21 A21 L22 A22 L23 A23
sketch "Sketch4" plane through (-60, 0, 0) normal (-1, 0, 0) x (0, 0, 1)
  arc A0 (-56.05, 47.55) -> (-57.2, 46.4) centre (-56.05, 46.4) ccw projected
  line L0 (-56.05, 47.55) -> (-51.5348, 47.55) projected
  arc A1 (-51.5348, 47.55) -> (-47.5, 52.2205) centre (-52.22, 52.22) ccw projected
  line L1 (-47.5, 52.2205) -> (-47.5376, 56.0387) projected
  arc A2 (-46.3876, 57.2) -> (-47.5376, 56.0387) centre (-46.3876, 56.05) ccw projected
  line L2 (-46.3876, 57.2) -> (-10.9124, 57.2) projected
  arc A3 (-9.7624, 56.0387) -> (-10.9124, 57.2) centre (-10.9124, 56.05) ccw projected
  line L3 (-9.7624, 56.0387) -> (-9.8, 52.2205) projected
  arc A4 (-9.8, 52.2205) -> (-5.7652, 47.55) centre (-5.08, 52.22) ccw projected
  line L4 (-5.7652, 47.55) -> (-1.25, 47.55) projected
  arc A5 (-0.1, 46.4) -> (-1.25, 47.55) centre (-1.25, 46.4) ccw projected
  line L5 (-0.1, 46.4) -> (-0.1, 10.9) projected
  arc A6 (-1.25, 9.75) -> (-0.1, 10.9) centre (-1.25, 10.9) ccw projected
  line L6 (-1.25, 9.75) -> (-5.7652, 9.75) projected
  arc A7 (-5.7652, 9.75) -> (-9.8, 5.0795) centre (-5.08, 5.08) ccw projected
  line L7 (-9.8, 5.0795) -> (-9.7624, 1.2613) projected
  arc A8 (-10.9124, 0.1) -> (-9.7624, 1.2613) centre (-10.9124, 1.25) ccw projected
  line L8 (-10.9124, 0.1) -> (-46.3876, 0.1) projected
  arc A9 (-47.5376, 1.2613) -> (-46.3876, 0.1) centre (-46.3876, 1.25) ccw projected
  line L9 (-47.5376, 1.2613) -> (-47.5, 5.0795) projected
  arc A10 (-47.5, 5.0795) -> (-51.5348, 9.75) centre (-52.22, 5.08) ccw projected
  line L10 (-51.5348, 9.75) -> (-56.05, 9.75) projected
  arc A11 (-57.2, 10.9) -> (-56.05, 9.75) centre (-56.05, 10.9) ccw projected
  line L11 (-57.2, 10.9) -> (-57.2, 46.4) projected
  line L12 (-51.5421, 47.65) -> (-56.05, 47.65) projected
  arc A12 (-56.05, 47.65) -> (-57.3, 46.4) centre (-56.05, 46.4) ccw projected
  line L13 (-57.3, 46.4) -> (-57.3, 10.9) projected
  arc A13 (-57.3, 10.9) -> (-56.05, 9.65) centre (-56.05, 10.9) ccw projected
  line L14 (-56.05, 9.65) -> (-51.5421, 9.65) projected
  arc A14 (-47.6, 5.08) -> (-51.5421, 9.65) centre (-52.22, 5.08) ccw projected
  line L15 (-47.6, 5.08) -> (-47.6376, 1.2623) projected
  arc A15 (-47.6376, 1.2623) -> (-46.3876, 0) centre (-46.3876, 1.25) ccw projected
  line L16 (-46.3876, 0) -> (-10.9124, 0) projected
  arc A16 (-10.9124, 0) -> (-9.6624, 1.2623) centre (-10.9124, 1.25) ccw projected
  line L17 (-9.6624, 1.2623) -> (-9.7, 5.08) projected
  arc A17 (-5.7579, 9.65) -> (-9.7, 5.08) centre (-5.08, 5.08) ccw projected
  line L18 (-5.7579, 9.65) -> (-1.25, 9.65) projected
  arc A18 (-1.25, 9.65) -> (0, 10.9) centre (-1.25, 10.9) ccw projected
  line L19 (0, 10.9) -> (0, 46.4) projected
  arc A19 (0, 46.4) -> (-1.25, 47.65) centre (-1.25, 46.4) ccw projected
  line L20 (-1.25, 47.65) -> (-5.7579, 47.65) projected
  arc A20 (-9.7, 52.22) -> (-5.7579, 47.65) centre (-5.08, 52.22) ccw projected
  line L21 (-9.7, 52.22) -> (-9.6624, 56.0377) projected
  arc A21 (-9.6624, 56.0377) -> (-10.9124, 57.3) centre (-10.9124, 56.05) ccw projected
  line L22 (-10.9124, 57.3) -> (-46.3876, 57.3) projected
  arc A22 (-46.3876, 57.3) -> (-47.6376, 56.0377) centre (-46.3876, 56.05) ccw projected
  line L23 (-47.6376, 56.0377) -> (-47.6, 52.22) projected
  arc A23 (-51.5421, 47.65) -> (-47.6, 52.22) centre (-52.22, 52.22) ccw projected
  point P0 (0, 0)
extrude "Extrusion4" add sketch "Sketch4" along normal blind 11 contours L0 A1 L1 A2 L2 A3 L3 A4 L4 A5 L5 A6 L6 A7 L7 A8 L8 A9 L9 A10 L10 A11 L11 A0 | A23 L23 A22 L22 A21 L21 A20 L20 A19 L19 A18 L18 A17 L17 A16 L16 A15 L15 A14 L14 A13 L13 A12 L12
sketch "Sketch5" plane through (5.5, 0, 0) normal (1, 0, 0) x (0, 0, -1)
  line L0 (46.3876, 57.2) -> (10.9124, 57.2) construction
  line L1 (28.65, 57.2) -> (28.65, 0.1) construction
  line L2 (10.9124, 0.1) -> (46.3876, 0.1) construction
  circle A0 centre (28.65, 28.65) radius 19.05
  point P0 (0, 0)
  dimension "d35" = 38.1
extrude "Extrusion5" add sketch "Sketch5" along normal blind 1.6
sketch "Sketch6" plane through (7.1, 28.65, -28.65) normal (1, 0, 0) x (0, 0, -1)
  circle A0 centre (0, 0) radius 3.175
  point P0 (-28.65, -28.65)
  dimension "d38" = 6.35
extrude "Extrusion6" add sketch "Sketch6" along normal blind 4.4
sketch "Sketch7" plane through (11.5, 28.65, -28.65) normal (1, 0, 0) x (0, 0, -1)
  circle A0 centre (0, 0) radius 3.175 projected
  line L0 (-9.5378, 2.375) -> (9.1058, 2.375)
  point P0 (-28.65, -28.65)
  point P1 (2.1071, 2.375)
  point P2 (-2.1071, 2.375)
  dimension "d41" = 2.375
extrude "Extrusion7" add sketch "Sketch7" along normal blind 15 contours A0 L0 picked at (0.5748, 0.6947)
sketch "Sketch8" plane through (-60, 57.3, -10.9124) normal (0, 1, 0) x (1, 0, 0)
  line L0 (-11, 35.4753) -> (-11, 0) projected
  line L1 (0, 0) -> (0, 35.4753) projected
  line L2 (-11, 11.75) -> (0, 11.75)
  line L3 (0, 11.75) -> (0, 23.75)
  line L4 (0, 23.75) -> (-11, 23.75)
  line L5 (-11, 23.75) -> (-11, 11.75)
  point P0 (60, -10.9124)
  point P1 (-11, 23.75)
  point P2 (0, 11.75)
  dimension "d44" = 12
  dimension "d45" = 11.75
extrude "Extrusion8" add sketch "Sketch8" along normal blind 1.5
equation "\"d5\" = d4"
equation "\"d6\" = d4"
equation "\"d7\" = d4"
equation "\"d13\" = d12"
equation "\"d14\" = d12"
equation "\"d15\" = d12"
equation "\"d17\" = d16"
equation "\"d18\" = d16"
equation "\"d19\" = d16"
equation "\"d21\" = d20"
equation "\"d22\" = d20"
equation "\"d23\" = d20"
equation "\"d24\" = d20"
equation "\"d25\" = d20"
equation "\"d26\" = d20"
equation "\"d27\" = d20"
properties part number "Nema 23 76.5mm Stepper Motor"
